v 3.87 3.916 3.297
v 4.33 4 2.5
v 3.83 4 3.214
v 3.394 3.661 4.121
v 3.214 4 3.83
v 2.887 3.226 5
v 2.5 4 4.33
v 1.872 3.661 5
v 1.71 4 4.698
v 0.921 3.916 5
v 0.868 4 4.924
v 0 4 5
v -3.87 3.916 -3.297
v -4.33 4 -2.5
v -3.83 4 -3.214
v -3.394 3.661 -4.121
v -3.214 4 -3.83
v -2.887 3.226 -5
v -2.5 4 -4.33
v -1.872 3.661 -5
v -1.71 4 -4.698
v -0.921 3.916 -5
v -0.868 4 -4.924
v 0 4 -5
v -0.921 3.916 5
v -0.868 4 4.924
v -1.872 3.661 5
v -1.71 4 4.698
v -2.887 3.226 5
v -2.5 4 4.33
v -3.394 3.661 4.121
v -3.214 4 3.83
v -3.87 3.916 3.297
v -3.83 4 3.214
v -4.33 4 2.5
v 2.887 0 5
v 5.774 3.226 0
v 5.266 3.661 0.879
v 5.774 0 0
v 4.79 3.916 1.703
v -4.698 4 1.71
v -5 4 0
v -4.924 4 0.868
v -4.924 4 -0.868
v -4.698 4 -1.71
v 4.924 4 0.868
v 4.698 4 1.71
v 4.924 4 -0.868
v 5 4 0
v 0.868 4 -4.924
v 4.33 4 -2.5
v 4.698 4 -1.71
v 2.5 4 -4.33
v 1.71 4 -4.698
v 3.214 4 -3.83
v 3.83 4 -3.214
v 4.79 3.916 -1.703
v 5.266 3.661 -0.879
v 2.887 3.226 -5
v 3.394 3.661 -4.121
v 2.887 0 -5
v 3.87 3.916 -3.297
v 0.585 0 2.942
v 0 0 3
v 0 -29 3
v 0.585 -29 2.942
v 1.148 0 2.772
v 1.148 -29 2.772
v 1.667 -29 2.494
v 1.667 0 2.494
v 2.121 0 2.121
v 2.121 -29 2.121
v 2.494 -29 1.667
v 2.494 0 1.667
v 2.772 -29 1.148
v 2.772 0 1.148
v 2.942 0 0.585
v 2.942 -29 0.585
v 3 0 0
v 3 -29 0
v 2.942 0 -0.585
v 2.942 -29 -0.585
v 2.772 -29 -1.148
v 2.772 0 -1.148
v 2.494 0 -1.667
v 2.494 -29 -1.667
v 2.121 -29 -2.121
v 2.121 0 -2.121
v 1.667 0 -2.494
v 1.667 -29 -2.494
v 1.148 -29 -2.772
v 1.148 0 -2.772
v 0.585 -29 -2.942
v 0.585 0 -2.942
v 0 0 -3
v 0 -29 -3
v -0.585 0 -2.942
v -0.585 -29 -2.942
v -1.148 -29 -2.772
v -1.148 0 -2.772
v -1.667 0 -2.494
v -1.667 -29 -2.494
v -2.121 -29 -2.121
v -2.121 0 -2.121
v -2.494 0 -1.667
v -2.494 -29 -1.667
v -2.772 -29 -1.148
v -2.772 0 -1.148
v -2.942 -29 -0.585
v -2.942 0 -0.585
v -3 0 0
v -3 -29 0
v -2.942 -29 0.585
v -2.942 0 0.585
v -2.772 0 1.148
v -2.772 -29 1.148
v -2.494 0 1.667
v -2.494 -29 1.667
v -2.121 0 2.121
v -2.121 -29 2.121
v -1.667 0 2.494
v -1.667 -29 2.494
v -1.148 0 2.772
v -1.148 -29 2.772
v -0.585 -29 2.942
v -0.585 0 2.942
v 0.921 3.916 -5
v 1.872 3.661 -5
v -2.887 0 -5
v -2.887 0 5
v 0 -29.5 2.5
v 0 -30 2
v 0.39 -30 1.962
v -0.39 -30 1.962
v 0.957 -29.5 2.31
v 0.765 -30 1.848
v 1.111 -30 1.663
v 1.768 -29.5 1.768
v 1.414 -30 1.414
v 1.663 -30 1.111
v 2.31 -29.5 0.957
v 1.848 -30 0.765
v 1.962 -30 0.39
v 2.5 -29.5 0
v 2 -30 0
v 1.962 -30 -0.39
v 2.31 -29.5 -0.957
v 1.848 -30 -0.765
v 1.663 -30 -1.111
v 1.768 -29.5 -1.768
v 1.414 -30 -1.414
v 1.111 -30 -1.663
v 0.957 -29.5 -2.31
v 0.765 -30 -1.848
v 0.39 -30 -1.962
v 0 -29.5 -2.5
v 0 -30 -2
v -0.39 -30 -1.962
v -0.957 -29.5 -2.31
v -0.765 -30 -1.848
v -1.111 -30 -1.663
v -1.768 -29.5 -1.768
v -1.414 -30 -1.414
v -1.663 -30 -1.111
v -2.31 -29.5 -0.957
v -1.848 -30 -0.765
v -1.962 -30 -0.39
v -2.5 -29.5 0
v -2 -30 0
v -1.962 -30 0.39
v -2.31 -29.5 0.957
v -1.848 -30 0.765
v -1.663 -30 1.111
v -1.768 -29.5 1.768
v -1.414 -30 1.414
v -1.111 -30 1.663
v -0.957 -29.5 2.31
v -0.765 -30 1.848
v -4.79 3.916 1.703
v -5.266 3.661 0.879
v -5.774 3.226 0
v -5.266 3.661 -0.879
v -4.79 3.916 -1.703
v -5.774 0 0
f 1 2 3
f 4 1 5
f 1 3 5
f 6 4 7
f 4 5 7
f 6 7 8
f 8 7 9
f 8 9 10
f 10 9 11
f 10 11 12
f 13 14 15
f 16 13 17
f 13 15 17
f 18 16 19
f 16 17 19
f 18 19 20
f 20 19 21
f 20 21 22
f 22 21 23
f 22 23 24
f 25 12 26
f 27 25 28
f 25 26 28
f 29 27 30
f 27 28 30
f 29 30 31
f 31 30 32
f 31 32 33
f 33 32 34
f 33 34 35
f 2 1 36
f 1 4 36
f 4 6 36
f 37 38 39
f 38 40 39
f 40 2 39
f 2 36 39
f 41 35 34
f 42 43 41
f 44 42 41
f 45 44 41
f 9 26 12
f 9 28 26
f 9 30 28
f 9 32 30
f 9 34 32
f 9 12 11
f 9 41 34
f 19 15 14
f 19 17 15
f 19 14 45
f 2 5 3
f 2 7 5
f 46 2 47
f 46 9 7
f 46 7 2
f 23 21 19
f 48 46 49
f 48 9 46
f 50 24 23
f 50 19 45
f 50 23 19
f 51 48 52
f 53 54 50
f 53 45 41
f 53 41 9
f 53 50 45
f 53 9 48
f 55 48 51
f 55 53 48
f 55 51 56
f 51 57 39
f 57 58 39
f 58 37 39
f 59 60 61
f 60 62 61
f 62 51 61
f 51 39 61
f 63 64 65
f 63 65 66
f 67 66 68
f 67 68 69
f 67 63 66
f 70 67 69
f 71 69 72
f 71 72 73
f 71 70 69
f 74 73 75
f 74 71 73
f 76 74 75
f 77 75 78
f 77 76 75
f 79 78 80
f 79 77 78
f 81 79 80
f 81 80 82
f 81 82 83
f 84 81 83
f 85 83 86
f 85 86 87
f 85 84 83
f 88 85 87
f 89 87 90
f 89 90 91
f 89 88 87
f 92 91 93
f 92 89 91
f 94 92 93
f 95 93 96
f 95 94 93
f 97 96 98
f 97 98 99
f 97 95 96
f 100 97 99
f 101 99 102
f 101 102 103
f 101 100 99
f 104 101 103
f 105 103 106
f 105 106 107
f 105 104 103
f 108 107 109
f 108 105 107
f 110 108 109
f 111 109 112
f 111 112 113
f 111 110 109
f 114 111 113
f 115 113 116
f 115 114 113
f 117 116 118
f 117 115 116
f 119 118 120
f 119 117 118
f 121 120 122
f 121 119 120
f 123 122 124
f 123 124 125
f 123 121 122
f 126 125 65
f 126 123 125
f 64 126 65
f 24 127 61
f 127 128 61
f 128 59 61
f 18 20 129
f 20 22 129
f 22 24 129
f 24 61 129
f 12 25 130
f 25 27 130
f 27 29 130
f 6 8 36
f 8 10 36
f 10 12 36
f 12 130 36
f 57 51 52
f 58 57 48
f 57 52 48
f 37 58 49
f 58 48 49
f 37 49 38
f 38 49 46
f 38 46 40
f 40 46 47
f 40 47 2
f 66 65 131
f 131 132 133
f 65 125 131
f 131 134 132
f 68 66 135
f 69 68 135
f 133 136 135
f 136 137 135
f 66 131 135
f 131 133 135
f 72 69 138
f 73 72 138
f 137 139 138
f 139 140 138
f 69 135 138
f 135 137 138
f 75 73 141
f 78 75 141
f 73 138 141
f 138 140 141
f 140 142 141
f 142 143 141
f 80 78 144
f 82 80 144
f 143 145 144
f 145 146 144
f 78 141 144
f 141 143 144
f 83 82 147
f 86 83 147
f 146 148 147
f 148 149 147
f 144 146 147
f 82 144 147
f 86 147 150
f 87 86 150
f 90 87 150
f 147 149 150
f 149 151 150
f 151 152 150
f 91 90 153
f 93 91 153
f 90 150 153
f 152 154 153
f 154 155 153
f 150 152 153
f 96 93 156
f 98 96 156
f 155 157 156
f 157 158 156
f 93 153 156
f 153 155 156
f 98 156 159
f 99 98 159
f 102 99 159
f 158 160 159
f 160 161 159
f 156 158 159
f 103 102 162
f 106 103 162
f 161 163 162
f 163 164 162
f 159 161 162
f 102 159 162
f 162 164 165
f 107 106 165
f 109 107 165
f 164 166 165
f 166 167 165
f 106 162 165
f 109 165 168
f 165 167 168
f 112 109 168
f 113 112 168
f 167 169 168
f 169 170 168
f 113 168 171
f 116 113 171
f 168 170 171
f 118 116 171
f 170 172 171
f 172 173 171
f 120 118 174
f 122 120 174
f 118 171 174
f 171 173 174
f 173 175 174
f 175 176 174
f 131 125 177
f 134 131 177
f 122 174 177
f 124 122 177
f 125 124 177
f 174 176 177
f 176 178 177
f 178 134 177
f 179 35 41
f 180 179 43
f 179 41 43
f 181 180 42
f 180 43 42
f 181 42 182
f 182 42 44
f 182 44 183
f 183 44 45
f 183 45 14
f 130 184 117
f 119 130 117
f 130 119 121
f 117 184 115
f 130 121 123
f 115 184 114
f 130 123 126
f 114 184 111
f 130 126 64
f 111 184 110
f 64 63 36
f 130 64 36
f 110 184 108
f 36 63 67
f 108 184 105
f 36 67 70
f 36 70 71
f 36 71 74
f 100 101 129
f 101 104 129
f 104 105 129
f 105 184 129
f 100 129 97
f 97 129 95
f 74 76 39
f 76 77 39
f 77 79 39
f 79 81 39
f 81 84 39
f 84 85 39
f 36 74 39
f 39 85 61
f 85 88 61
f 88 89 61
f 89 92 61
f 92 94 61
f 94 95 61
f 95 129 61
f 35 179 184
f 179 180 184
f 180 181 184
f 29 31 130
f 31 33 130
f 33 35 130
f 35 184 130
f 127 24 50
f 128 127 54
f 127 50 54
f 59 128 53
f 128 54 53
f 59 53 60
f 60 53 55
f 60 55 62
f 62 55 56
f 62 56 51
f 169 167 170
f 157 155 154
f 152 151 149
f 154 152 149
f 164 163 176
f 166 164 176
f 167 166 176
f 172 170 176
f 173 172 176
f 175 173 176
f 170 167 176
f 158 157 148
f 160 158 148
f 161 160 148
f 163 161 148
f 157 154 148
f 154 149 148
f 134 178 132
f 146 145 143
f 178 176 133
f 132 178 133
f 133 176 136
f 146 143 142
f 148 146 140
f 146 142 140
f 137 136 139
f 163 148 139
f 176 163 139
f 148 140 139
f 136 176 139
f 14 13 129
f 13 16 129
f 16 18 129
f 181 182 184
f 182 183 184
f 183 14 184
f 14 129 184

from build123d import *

# Parameters (mm, degrees)
SZKIC1_R                    = 3
DODANIE_WYCI_GNI_CIE1_DEPTH = 30
DODANIE_WYCI_GNI_CIE2_DEPTH = 4
SFAZOWANIE1_SIZE            = 1


with BuildPart() as part:
    # Szkic1 → Dodanie-wyciągnięcie1 (new body)
    with BuildSketch(Plane(origin=(0, 0, 0), x_dir=(1, 0, 0), z_dir=(0, 1, 0))):
        with Locations(Location((0, 0, 0), (0, 0, 270))):
            Circle(SZKIC1_R)
    extrude(amount=-DODANIE_WYCI_GNI_CIE1_DEPTH)

    # Szkic2 → Dodanie-wyciągnięcie2 (add)
    with BuildSketch(Plane(origin=(0, 0, 0), x_dir=(1, 0, 0), z_dir=(0, 1, 0))):
        Polygon((5.773502692, 0), (2.886751346, 5), (-2.886751346, 5), (-5.773502692, 0), (-2.886751346, -5), (2.886751346, -5), align=None)
    extrude(amount=DODANIE_WYCI_GNI_CIE2_DEPTH)

    # Szkic4 → Wycięcie-obrót1 (revolve, cut)
    with BuildSketch(Plane.XY):
        Polygon((5.773502692, 3.226497308), (5, 4), (5.773502692, 4), align=None)
    revolve(axis=Axis((0, 4, 0), (0, -1, 0)), mode=Mode.SUBTRACT)

    # Sfazowanie1
    sfazowanie1_edges = [part.edges().sort_by_distance(p)[0] for p in [
        (0, -30, -3),
    ]]
    chamfer(sfazowanie1_edges, length=SFAZOWANIE1_SIZE)


solid = part.part
